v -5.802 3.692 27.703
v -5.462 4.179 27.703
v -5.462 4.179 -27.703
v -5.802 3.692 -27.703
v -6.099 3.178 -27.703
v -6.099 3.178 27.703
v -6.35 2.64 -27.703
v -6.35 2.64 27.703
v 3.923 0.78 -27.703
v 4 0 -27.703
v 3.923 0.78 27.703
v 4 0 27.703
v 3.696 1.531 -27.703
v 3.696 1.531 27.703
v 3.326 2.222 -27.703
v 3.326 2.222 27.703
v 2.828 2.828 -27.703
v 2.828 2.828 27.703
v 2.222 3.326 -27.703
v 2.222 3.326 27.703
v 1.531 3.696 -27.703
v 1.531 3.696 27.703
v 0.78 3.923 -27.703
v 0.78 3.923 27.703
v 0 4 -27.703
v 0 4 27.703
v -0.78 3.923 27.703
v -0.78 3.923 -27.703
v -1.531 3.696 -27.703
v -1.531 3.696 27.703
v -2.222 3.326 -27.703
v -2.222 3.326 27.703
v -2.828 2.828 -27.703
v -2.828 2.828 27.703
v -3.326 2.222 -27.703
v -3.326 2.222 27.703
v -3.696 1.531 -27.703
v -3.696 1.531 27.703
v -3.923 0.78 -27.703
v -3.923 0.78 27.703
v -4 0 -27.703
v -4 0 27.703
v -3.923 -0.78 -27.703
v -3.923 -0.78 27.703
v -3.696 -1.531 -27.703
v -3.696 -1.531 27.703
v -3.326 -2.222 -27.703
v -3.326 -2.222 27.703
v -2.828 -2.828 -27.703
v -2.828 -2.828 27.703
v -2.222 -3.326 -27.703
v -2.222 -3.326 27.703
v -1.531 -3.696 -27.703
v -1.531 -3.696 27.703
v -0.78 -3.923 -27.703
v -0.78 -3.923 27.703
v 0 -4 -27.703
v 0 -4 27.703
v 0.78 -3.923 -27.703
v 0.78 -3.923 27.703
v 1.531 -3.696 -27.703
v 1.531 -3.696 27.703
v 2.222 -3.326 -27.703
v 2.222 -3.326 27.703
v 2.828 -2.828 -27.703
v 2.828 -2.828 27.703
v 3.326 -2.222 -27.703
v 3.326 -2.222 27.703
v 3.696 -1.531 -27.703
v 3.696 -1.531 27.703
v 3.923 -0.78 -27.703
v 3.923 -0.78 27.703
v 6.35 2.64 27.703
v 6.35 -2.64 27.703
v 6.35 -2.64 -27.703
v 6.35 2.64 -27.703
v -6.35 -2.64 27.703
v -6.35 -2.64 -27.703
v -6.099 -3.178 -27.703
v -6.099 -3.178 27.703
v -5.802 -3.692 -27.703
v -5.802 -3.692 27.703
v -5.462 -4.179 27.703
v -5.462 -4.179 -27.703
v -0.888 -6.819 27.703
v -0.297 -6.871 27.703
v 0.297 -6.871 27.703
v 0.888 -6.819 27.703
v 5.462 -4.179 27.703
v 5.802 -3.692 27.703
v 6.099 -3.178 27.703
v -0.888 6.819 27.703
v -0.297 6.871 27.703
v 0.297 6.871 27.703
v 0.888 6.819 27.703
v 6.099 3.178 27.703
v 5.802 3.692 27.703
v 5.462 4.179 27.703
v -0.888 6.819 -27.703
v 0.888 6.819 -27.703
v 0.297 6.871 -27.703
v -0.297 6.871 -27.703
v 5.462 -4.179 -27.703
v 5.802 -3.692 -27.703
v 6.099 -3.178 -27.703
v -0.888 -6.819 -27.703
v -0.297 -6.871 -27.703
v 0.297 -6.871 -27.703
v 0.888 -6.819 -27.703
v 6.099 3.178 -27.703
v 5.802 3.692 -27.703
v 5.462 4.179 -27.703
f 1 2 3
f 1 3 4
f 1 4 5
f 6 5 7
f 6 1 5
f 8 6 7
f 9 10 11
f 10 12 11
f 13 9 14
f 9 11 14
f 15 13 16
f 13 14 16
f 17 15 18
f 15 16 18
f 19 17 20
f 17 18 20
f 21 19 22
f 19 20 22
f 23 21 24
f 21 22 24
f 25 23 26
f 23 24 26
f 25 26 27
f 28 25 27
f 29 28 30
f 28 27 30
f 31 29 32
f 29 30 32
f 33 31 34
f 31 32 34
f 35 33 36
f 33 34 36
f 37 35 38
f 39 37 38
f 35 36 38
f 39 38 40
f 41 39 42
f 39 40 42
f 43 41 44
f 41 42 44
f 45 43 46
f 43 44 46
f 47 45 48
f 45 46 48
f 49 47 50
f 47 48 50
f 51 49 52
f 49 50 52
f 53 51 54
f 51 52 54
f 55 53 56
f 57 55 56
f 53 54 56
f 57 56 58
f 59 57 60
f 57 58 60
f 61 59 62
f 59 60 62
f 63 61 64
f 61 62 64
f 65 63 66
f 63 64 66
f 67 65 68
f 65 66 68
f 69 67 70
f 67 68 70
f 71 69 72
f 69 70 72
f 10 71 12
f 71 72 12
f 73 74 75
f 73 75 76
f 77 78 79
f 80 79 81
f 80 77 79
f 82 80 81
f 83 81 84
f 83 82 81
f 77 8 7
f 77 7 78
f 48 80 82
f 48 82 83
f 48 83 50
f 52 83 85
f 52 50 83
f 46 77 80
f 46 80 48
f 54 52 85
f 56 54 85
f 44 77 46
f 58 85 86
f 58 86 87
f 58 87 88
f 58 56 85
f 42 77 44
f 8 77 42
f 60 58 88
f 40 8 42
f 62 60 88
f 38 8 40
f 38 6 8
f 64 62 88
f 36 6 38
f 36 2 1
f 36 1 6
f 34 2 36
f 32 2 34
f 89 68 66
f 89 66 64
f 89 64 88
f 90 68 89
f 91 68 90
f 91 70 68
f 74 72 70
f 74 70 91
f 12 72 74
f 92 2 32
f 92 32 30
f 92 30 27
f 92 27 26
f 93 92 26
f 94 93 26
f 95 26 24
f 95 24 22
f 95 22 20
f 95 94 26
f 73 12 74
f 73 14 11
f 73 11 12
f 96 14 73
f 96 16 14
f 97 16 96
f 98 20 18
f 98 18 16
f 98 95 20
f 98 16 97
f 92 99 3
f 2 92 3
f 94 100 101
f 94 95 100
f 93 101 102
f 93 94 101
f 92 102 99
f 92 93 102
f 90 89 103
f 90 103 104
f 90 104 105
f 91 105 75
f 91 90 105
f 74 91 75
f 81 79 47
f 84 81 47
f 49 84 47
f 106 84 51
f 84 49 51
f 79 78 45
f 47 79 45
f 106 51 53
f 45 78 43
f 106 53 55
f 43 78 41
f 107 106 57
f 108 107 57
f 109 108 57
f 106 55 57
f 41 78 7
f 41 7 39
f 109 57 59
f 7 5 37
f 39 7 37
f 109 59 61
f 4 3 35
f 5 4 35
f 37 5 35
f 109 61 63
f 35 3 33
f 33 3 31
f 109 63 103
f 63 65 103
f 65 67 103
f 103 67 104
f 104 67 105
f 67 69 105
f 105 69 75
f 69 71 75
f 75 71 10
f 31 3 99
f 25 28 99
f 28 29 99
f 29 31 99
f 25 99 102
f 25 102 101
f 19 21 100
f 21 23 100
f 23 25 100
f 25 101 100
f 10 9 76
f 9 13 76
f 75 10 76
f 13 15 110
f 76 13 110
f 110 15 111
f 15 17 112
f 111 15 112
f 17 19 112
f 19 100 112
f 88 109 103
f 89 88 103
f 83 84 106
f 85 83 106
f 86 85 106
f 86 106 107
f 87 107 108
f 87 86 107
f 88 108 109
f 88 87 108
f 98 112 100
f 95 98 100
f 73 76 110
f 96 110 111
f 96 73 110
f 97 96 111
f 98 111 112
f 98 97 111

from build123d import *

# Parameters (mm, degrees)
SKETCH1_R               = 6.35
BASIC_ROD_DEPTH         = 27.70251
BASIC_ROD_DEPTH_BACK    = 27.70251
THEX_DEPTH              = 27.70251
SKETCH2_R               = 4
INTERNAL_CUT_DEPTH      = 28.70251
INTERNAL_CUT_DEPTH_BACK = 28.70251


with BuildPart() as part:
    # Sketch1 → Basic Rod (new body, two sides)
    with BuildSketch(Plane.XY) as basic_rod_sk:
        Circle(SKETCH1_R)
    extrude(amount=BASIC_ROD_DEPTH)
    extrude(basic_rod_sk.sketch, amount=-BASIC_ROD_DEPTH_BACK)

    # Sketch8 → THex (add, symmetric)
    with BuildSketch(Plane.XY):
        with BuildLine():
            Line((-0.888411378, 6.819423871), (-5.461588622, 4.179098758))
            ThreePointArc((-5.461588622, 4.179098758), (-5.955700003, 3.438525), (-6.35, 2.640325113))
            Line((-6.35, 2.640325113), (-6.35, -2.640325113))
            ThreePointArc((-6.35, -2.640325113), (-5.955700003, -3.438525), (-5.461588622, -4.179098758))
            Line((-5.461588622, -4.179098758), (-0.888411378, -6.819423871))
            ThreePointArc((-0.888411378, -6.819423871), (0, -6.87705), (0.888411378, -6.819423871))
            Line((0.888411378, -6.819423871), (5.461588622, -4.179098758))
            ThreePointArc((5.461588622, -4.179098758), (5.955700003, -3.438525), (6.35, -2.640325113))
            Line((6.35, -2.640325113), (6.35, 2.640325113))
            ThreePointArc((6.35, 2.640325113), (5.955700003, 3.438525), (5.461588622, 4.179098758))
            Line((5.461588622, 4.179098758), (0.888411378, 6.819423871))
            ThreePointArc((0.888411378, 6.819423871), (0, 6.87705), (-0.888411378, 6.819423871))
        make_face()
    extrude(amount=THEX_DEPTH, both=True)

    # Sketch2 → Internal Cut (cut, two sides)
    with BuildSketch(Plane.XY) as internal_cut_sk:
        Circle(SKETCH2_R)
    extrude(amount=INTERNAL_CUT_DEPTH, mode=Mode.SUBTRACT)
    extrude(internal_cut_sk.sketch, amount=-INTERNAL_CUT_DEPTH_BACK, mode=Mode.SUBTRACT)


solid = part.part
